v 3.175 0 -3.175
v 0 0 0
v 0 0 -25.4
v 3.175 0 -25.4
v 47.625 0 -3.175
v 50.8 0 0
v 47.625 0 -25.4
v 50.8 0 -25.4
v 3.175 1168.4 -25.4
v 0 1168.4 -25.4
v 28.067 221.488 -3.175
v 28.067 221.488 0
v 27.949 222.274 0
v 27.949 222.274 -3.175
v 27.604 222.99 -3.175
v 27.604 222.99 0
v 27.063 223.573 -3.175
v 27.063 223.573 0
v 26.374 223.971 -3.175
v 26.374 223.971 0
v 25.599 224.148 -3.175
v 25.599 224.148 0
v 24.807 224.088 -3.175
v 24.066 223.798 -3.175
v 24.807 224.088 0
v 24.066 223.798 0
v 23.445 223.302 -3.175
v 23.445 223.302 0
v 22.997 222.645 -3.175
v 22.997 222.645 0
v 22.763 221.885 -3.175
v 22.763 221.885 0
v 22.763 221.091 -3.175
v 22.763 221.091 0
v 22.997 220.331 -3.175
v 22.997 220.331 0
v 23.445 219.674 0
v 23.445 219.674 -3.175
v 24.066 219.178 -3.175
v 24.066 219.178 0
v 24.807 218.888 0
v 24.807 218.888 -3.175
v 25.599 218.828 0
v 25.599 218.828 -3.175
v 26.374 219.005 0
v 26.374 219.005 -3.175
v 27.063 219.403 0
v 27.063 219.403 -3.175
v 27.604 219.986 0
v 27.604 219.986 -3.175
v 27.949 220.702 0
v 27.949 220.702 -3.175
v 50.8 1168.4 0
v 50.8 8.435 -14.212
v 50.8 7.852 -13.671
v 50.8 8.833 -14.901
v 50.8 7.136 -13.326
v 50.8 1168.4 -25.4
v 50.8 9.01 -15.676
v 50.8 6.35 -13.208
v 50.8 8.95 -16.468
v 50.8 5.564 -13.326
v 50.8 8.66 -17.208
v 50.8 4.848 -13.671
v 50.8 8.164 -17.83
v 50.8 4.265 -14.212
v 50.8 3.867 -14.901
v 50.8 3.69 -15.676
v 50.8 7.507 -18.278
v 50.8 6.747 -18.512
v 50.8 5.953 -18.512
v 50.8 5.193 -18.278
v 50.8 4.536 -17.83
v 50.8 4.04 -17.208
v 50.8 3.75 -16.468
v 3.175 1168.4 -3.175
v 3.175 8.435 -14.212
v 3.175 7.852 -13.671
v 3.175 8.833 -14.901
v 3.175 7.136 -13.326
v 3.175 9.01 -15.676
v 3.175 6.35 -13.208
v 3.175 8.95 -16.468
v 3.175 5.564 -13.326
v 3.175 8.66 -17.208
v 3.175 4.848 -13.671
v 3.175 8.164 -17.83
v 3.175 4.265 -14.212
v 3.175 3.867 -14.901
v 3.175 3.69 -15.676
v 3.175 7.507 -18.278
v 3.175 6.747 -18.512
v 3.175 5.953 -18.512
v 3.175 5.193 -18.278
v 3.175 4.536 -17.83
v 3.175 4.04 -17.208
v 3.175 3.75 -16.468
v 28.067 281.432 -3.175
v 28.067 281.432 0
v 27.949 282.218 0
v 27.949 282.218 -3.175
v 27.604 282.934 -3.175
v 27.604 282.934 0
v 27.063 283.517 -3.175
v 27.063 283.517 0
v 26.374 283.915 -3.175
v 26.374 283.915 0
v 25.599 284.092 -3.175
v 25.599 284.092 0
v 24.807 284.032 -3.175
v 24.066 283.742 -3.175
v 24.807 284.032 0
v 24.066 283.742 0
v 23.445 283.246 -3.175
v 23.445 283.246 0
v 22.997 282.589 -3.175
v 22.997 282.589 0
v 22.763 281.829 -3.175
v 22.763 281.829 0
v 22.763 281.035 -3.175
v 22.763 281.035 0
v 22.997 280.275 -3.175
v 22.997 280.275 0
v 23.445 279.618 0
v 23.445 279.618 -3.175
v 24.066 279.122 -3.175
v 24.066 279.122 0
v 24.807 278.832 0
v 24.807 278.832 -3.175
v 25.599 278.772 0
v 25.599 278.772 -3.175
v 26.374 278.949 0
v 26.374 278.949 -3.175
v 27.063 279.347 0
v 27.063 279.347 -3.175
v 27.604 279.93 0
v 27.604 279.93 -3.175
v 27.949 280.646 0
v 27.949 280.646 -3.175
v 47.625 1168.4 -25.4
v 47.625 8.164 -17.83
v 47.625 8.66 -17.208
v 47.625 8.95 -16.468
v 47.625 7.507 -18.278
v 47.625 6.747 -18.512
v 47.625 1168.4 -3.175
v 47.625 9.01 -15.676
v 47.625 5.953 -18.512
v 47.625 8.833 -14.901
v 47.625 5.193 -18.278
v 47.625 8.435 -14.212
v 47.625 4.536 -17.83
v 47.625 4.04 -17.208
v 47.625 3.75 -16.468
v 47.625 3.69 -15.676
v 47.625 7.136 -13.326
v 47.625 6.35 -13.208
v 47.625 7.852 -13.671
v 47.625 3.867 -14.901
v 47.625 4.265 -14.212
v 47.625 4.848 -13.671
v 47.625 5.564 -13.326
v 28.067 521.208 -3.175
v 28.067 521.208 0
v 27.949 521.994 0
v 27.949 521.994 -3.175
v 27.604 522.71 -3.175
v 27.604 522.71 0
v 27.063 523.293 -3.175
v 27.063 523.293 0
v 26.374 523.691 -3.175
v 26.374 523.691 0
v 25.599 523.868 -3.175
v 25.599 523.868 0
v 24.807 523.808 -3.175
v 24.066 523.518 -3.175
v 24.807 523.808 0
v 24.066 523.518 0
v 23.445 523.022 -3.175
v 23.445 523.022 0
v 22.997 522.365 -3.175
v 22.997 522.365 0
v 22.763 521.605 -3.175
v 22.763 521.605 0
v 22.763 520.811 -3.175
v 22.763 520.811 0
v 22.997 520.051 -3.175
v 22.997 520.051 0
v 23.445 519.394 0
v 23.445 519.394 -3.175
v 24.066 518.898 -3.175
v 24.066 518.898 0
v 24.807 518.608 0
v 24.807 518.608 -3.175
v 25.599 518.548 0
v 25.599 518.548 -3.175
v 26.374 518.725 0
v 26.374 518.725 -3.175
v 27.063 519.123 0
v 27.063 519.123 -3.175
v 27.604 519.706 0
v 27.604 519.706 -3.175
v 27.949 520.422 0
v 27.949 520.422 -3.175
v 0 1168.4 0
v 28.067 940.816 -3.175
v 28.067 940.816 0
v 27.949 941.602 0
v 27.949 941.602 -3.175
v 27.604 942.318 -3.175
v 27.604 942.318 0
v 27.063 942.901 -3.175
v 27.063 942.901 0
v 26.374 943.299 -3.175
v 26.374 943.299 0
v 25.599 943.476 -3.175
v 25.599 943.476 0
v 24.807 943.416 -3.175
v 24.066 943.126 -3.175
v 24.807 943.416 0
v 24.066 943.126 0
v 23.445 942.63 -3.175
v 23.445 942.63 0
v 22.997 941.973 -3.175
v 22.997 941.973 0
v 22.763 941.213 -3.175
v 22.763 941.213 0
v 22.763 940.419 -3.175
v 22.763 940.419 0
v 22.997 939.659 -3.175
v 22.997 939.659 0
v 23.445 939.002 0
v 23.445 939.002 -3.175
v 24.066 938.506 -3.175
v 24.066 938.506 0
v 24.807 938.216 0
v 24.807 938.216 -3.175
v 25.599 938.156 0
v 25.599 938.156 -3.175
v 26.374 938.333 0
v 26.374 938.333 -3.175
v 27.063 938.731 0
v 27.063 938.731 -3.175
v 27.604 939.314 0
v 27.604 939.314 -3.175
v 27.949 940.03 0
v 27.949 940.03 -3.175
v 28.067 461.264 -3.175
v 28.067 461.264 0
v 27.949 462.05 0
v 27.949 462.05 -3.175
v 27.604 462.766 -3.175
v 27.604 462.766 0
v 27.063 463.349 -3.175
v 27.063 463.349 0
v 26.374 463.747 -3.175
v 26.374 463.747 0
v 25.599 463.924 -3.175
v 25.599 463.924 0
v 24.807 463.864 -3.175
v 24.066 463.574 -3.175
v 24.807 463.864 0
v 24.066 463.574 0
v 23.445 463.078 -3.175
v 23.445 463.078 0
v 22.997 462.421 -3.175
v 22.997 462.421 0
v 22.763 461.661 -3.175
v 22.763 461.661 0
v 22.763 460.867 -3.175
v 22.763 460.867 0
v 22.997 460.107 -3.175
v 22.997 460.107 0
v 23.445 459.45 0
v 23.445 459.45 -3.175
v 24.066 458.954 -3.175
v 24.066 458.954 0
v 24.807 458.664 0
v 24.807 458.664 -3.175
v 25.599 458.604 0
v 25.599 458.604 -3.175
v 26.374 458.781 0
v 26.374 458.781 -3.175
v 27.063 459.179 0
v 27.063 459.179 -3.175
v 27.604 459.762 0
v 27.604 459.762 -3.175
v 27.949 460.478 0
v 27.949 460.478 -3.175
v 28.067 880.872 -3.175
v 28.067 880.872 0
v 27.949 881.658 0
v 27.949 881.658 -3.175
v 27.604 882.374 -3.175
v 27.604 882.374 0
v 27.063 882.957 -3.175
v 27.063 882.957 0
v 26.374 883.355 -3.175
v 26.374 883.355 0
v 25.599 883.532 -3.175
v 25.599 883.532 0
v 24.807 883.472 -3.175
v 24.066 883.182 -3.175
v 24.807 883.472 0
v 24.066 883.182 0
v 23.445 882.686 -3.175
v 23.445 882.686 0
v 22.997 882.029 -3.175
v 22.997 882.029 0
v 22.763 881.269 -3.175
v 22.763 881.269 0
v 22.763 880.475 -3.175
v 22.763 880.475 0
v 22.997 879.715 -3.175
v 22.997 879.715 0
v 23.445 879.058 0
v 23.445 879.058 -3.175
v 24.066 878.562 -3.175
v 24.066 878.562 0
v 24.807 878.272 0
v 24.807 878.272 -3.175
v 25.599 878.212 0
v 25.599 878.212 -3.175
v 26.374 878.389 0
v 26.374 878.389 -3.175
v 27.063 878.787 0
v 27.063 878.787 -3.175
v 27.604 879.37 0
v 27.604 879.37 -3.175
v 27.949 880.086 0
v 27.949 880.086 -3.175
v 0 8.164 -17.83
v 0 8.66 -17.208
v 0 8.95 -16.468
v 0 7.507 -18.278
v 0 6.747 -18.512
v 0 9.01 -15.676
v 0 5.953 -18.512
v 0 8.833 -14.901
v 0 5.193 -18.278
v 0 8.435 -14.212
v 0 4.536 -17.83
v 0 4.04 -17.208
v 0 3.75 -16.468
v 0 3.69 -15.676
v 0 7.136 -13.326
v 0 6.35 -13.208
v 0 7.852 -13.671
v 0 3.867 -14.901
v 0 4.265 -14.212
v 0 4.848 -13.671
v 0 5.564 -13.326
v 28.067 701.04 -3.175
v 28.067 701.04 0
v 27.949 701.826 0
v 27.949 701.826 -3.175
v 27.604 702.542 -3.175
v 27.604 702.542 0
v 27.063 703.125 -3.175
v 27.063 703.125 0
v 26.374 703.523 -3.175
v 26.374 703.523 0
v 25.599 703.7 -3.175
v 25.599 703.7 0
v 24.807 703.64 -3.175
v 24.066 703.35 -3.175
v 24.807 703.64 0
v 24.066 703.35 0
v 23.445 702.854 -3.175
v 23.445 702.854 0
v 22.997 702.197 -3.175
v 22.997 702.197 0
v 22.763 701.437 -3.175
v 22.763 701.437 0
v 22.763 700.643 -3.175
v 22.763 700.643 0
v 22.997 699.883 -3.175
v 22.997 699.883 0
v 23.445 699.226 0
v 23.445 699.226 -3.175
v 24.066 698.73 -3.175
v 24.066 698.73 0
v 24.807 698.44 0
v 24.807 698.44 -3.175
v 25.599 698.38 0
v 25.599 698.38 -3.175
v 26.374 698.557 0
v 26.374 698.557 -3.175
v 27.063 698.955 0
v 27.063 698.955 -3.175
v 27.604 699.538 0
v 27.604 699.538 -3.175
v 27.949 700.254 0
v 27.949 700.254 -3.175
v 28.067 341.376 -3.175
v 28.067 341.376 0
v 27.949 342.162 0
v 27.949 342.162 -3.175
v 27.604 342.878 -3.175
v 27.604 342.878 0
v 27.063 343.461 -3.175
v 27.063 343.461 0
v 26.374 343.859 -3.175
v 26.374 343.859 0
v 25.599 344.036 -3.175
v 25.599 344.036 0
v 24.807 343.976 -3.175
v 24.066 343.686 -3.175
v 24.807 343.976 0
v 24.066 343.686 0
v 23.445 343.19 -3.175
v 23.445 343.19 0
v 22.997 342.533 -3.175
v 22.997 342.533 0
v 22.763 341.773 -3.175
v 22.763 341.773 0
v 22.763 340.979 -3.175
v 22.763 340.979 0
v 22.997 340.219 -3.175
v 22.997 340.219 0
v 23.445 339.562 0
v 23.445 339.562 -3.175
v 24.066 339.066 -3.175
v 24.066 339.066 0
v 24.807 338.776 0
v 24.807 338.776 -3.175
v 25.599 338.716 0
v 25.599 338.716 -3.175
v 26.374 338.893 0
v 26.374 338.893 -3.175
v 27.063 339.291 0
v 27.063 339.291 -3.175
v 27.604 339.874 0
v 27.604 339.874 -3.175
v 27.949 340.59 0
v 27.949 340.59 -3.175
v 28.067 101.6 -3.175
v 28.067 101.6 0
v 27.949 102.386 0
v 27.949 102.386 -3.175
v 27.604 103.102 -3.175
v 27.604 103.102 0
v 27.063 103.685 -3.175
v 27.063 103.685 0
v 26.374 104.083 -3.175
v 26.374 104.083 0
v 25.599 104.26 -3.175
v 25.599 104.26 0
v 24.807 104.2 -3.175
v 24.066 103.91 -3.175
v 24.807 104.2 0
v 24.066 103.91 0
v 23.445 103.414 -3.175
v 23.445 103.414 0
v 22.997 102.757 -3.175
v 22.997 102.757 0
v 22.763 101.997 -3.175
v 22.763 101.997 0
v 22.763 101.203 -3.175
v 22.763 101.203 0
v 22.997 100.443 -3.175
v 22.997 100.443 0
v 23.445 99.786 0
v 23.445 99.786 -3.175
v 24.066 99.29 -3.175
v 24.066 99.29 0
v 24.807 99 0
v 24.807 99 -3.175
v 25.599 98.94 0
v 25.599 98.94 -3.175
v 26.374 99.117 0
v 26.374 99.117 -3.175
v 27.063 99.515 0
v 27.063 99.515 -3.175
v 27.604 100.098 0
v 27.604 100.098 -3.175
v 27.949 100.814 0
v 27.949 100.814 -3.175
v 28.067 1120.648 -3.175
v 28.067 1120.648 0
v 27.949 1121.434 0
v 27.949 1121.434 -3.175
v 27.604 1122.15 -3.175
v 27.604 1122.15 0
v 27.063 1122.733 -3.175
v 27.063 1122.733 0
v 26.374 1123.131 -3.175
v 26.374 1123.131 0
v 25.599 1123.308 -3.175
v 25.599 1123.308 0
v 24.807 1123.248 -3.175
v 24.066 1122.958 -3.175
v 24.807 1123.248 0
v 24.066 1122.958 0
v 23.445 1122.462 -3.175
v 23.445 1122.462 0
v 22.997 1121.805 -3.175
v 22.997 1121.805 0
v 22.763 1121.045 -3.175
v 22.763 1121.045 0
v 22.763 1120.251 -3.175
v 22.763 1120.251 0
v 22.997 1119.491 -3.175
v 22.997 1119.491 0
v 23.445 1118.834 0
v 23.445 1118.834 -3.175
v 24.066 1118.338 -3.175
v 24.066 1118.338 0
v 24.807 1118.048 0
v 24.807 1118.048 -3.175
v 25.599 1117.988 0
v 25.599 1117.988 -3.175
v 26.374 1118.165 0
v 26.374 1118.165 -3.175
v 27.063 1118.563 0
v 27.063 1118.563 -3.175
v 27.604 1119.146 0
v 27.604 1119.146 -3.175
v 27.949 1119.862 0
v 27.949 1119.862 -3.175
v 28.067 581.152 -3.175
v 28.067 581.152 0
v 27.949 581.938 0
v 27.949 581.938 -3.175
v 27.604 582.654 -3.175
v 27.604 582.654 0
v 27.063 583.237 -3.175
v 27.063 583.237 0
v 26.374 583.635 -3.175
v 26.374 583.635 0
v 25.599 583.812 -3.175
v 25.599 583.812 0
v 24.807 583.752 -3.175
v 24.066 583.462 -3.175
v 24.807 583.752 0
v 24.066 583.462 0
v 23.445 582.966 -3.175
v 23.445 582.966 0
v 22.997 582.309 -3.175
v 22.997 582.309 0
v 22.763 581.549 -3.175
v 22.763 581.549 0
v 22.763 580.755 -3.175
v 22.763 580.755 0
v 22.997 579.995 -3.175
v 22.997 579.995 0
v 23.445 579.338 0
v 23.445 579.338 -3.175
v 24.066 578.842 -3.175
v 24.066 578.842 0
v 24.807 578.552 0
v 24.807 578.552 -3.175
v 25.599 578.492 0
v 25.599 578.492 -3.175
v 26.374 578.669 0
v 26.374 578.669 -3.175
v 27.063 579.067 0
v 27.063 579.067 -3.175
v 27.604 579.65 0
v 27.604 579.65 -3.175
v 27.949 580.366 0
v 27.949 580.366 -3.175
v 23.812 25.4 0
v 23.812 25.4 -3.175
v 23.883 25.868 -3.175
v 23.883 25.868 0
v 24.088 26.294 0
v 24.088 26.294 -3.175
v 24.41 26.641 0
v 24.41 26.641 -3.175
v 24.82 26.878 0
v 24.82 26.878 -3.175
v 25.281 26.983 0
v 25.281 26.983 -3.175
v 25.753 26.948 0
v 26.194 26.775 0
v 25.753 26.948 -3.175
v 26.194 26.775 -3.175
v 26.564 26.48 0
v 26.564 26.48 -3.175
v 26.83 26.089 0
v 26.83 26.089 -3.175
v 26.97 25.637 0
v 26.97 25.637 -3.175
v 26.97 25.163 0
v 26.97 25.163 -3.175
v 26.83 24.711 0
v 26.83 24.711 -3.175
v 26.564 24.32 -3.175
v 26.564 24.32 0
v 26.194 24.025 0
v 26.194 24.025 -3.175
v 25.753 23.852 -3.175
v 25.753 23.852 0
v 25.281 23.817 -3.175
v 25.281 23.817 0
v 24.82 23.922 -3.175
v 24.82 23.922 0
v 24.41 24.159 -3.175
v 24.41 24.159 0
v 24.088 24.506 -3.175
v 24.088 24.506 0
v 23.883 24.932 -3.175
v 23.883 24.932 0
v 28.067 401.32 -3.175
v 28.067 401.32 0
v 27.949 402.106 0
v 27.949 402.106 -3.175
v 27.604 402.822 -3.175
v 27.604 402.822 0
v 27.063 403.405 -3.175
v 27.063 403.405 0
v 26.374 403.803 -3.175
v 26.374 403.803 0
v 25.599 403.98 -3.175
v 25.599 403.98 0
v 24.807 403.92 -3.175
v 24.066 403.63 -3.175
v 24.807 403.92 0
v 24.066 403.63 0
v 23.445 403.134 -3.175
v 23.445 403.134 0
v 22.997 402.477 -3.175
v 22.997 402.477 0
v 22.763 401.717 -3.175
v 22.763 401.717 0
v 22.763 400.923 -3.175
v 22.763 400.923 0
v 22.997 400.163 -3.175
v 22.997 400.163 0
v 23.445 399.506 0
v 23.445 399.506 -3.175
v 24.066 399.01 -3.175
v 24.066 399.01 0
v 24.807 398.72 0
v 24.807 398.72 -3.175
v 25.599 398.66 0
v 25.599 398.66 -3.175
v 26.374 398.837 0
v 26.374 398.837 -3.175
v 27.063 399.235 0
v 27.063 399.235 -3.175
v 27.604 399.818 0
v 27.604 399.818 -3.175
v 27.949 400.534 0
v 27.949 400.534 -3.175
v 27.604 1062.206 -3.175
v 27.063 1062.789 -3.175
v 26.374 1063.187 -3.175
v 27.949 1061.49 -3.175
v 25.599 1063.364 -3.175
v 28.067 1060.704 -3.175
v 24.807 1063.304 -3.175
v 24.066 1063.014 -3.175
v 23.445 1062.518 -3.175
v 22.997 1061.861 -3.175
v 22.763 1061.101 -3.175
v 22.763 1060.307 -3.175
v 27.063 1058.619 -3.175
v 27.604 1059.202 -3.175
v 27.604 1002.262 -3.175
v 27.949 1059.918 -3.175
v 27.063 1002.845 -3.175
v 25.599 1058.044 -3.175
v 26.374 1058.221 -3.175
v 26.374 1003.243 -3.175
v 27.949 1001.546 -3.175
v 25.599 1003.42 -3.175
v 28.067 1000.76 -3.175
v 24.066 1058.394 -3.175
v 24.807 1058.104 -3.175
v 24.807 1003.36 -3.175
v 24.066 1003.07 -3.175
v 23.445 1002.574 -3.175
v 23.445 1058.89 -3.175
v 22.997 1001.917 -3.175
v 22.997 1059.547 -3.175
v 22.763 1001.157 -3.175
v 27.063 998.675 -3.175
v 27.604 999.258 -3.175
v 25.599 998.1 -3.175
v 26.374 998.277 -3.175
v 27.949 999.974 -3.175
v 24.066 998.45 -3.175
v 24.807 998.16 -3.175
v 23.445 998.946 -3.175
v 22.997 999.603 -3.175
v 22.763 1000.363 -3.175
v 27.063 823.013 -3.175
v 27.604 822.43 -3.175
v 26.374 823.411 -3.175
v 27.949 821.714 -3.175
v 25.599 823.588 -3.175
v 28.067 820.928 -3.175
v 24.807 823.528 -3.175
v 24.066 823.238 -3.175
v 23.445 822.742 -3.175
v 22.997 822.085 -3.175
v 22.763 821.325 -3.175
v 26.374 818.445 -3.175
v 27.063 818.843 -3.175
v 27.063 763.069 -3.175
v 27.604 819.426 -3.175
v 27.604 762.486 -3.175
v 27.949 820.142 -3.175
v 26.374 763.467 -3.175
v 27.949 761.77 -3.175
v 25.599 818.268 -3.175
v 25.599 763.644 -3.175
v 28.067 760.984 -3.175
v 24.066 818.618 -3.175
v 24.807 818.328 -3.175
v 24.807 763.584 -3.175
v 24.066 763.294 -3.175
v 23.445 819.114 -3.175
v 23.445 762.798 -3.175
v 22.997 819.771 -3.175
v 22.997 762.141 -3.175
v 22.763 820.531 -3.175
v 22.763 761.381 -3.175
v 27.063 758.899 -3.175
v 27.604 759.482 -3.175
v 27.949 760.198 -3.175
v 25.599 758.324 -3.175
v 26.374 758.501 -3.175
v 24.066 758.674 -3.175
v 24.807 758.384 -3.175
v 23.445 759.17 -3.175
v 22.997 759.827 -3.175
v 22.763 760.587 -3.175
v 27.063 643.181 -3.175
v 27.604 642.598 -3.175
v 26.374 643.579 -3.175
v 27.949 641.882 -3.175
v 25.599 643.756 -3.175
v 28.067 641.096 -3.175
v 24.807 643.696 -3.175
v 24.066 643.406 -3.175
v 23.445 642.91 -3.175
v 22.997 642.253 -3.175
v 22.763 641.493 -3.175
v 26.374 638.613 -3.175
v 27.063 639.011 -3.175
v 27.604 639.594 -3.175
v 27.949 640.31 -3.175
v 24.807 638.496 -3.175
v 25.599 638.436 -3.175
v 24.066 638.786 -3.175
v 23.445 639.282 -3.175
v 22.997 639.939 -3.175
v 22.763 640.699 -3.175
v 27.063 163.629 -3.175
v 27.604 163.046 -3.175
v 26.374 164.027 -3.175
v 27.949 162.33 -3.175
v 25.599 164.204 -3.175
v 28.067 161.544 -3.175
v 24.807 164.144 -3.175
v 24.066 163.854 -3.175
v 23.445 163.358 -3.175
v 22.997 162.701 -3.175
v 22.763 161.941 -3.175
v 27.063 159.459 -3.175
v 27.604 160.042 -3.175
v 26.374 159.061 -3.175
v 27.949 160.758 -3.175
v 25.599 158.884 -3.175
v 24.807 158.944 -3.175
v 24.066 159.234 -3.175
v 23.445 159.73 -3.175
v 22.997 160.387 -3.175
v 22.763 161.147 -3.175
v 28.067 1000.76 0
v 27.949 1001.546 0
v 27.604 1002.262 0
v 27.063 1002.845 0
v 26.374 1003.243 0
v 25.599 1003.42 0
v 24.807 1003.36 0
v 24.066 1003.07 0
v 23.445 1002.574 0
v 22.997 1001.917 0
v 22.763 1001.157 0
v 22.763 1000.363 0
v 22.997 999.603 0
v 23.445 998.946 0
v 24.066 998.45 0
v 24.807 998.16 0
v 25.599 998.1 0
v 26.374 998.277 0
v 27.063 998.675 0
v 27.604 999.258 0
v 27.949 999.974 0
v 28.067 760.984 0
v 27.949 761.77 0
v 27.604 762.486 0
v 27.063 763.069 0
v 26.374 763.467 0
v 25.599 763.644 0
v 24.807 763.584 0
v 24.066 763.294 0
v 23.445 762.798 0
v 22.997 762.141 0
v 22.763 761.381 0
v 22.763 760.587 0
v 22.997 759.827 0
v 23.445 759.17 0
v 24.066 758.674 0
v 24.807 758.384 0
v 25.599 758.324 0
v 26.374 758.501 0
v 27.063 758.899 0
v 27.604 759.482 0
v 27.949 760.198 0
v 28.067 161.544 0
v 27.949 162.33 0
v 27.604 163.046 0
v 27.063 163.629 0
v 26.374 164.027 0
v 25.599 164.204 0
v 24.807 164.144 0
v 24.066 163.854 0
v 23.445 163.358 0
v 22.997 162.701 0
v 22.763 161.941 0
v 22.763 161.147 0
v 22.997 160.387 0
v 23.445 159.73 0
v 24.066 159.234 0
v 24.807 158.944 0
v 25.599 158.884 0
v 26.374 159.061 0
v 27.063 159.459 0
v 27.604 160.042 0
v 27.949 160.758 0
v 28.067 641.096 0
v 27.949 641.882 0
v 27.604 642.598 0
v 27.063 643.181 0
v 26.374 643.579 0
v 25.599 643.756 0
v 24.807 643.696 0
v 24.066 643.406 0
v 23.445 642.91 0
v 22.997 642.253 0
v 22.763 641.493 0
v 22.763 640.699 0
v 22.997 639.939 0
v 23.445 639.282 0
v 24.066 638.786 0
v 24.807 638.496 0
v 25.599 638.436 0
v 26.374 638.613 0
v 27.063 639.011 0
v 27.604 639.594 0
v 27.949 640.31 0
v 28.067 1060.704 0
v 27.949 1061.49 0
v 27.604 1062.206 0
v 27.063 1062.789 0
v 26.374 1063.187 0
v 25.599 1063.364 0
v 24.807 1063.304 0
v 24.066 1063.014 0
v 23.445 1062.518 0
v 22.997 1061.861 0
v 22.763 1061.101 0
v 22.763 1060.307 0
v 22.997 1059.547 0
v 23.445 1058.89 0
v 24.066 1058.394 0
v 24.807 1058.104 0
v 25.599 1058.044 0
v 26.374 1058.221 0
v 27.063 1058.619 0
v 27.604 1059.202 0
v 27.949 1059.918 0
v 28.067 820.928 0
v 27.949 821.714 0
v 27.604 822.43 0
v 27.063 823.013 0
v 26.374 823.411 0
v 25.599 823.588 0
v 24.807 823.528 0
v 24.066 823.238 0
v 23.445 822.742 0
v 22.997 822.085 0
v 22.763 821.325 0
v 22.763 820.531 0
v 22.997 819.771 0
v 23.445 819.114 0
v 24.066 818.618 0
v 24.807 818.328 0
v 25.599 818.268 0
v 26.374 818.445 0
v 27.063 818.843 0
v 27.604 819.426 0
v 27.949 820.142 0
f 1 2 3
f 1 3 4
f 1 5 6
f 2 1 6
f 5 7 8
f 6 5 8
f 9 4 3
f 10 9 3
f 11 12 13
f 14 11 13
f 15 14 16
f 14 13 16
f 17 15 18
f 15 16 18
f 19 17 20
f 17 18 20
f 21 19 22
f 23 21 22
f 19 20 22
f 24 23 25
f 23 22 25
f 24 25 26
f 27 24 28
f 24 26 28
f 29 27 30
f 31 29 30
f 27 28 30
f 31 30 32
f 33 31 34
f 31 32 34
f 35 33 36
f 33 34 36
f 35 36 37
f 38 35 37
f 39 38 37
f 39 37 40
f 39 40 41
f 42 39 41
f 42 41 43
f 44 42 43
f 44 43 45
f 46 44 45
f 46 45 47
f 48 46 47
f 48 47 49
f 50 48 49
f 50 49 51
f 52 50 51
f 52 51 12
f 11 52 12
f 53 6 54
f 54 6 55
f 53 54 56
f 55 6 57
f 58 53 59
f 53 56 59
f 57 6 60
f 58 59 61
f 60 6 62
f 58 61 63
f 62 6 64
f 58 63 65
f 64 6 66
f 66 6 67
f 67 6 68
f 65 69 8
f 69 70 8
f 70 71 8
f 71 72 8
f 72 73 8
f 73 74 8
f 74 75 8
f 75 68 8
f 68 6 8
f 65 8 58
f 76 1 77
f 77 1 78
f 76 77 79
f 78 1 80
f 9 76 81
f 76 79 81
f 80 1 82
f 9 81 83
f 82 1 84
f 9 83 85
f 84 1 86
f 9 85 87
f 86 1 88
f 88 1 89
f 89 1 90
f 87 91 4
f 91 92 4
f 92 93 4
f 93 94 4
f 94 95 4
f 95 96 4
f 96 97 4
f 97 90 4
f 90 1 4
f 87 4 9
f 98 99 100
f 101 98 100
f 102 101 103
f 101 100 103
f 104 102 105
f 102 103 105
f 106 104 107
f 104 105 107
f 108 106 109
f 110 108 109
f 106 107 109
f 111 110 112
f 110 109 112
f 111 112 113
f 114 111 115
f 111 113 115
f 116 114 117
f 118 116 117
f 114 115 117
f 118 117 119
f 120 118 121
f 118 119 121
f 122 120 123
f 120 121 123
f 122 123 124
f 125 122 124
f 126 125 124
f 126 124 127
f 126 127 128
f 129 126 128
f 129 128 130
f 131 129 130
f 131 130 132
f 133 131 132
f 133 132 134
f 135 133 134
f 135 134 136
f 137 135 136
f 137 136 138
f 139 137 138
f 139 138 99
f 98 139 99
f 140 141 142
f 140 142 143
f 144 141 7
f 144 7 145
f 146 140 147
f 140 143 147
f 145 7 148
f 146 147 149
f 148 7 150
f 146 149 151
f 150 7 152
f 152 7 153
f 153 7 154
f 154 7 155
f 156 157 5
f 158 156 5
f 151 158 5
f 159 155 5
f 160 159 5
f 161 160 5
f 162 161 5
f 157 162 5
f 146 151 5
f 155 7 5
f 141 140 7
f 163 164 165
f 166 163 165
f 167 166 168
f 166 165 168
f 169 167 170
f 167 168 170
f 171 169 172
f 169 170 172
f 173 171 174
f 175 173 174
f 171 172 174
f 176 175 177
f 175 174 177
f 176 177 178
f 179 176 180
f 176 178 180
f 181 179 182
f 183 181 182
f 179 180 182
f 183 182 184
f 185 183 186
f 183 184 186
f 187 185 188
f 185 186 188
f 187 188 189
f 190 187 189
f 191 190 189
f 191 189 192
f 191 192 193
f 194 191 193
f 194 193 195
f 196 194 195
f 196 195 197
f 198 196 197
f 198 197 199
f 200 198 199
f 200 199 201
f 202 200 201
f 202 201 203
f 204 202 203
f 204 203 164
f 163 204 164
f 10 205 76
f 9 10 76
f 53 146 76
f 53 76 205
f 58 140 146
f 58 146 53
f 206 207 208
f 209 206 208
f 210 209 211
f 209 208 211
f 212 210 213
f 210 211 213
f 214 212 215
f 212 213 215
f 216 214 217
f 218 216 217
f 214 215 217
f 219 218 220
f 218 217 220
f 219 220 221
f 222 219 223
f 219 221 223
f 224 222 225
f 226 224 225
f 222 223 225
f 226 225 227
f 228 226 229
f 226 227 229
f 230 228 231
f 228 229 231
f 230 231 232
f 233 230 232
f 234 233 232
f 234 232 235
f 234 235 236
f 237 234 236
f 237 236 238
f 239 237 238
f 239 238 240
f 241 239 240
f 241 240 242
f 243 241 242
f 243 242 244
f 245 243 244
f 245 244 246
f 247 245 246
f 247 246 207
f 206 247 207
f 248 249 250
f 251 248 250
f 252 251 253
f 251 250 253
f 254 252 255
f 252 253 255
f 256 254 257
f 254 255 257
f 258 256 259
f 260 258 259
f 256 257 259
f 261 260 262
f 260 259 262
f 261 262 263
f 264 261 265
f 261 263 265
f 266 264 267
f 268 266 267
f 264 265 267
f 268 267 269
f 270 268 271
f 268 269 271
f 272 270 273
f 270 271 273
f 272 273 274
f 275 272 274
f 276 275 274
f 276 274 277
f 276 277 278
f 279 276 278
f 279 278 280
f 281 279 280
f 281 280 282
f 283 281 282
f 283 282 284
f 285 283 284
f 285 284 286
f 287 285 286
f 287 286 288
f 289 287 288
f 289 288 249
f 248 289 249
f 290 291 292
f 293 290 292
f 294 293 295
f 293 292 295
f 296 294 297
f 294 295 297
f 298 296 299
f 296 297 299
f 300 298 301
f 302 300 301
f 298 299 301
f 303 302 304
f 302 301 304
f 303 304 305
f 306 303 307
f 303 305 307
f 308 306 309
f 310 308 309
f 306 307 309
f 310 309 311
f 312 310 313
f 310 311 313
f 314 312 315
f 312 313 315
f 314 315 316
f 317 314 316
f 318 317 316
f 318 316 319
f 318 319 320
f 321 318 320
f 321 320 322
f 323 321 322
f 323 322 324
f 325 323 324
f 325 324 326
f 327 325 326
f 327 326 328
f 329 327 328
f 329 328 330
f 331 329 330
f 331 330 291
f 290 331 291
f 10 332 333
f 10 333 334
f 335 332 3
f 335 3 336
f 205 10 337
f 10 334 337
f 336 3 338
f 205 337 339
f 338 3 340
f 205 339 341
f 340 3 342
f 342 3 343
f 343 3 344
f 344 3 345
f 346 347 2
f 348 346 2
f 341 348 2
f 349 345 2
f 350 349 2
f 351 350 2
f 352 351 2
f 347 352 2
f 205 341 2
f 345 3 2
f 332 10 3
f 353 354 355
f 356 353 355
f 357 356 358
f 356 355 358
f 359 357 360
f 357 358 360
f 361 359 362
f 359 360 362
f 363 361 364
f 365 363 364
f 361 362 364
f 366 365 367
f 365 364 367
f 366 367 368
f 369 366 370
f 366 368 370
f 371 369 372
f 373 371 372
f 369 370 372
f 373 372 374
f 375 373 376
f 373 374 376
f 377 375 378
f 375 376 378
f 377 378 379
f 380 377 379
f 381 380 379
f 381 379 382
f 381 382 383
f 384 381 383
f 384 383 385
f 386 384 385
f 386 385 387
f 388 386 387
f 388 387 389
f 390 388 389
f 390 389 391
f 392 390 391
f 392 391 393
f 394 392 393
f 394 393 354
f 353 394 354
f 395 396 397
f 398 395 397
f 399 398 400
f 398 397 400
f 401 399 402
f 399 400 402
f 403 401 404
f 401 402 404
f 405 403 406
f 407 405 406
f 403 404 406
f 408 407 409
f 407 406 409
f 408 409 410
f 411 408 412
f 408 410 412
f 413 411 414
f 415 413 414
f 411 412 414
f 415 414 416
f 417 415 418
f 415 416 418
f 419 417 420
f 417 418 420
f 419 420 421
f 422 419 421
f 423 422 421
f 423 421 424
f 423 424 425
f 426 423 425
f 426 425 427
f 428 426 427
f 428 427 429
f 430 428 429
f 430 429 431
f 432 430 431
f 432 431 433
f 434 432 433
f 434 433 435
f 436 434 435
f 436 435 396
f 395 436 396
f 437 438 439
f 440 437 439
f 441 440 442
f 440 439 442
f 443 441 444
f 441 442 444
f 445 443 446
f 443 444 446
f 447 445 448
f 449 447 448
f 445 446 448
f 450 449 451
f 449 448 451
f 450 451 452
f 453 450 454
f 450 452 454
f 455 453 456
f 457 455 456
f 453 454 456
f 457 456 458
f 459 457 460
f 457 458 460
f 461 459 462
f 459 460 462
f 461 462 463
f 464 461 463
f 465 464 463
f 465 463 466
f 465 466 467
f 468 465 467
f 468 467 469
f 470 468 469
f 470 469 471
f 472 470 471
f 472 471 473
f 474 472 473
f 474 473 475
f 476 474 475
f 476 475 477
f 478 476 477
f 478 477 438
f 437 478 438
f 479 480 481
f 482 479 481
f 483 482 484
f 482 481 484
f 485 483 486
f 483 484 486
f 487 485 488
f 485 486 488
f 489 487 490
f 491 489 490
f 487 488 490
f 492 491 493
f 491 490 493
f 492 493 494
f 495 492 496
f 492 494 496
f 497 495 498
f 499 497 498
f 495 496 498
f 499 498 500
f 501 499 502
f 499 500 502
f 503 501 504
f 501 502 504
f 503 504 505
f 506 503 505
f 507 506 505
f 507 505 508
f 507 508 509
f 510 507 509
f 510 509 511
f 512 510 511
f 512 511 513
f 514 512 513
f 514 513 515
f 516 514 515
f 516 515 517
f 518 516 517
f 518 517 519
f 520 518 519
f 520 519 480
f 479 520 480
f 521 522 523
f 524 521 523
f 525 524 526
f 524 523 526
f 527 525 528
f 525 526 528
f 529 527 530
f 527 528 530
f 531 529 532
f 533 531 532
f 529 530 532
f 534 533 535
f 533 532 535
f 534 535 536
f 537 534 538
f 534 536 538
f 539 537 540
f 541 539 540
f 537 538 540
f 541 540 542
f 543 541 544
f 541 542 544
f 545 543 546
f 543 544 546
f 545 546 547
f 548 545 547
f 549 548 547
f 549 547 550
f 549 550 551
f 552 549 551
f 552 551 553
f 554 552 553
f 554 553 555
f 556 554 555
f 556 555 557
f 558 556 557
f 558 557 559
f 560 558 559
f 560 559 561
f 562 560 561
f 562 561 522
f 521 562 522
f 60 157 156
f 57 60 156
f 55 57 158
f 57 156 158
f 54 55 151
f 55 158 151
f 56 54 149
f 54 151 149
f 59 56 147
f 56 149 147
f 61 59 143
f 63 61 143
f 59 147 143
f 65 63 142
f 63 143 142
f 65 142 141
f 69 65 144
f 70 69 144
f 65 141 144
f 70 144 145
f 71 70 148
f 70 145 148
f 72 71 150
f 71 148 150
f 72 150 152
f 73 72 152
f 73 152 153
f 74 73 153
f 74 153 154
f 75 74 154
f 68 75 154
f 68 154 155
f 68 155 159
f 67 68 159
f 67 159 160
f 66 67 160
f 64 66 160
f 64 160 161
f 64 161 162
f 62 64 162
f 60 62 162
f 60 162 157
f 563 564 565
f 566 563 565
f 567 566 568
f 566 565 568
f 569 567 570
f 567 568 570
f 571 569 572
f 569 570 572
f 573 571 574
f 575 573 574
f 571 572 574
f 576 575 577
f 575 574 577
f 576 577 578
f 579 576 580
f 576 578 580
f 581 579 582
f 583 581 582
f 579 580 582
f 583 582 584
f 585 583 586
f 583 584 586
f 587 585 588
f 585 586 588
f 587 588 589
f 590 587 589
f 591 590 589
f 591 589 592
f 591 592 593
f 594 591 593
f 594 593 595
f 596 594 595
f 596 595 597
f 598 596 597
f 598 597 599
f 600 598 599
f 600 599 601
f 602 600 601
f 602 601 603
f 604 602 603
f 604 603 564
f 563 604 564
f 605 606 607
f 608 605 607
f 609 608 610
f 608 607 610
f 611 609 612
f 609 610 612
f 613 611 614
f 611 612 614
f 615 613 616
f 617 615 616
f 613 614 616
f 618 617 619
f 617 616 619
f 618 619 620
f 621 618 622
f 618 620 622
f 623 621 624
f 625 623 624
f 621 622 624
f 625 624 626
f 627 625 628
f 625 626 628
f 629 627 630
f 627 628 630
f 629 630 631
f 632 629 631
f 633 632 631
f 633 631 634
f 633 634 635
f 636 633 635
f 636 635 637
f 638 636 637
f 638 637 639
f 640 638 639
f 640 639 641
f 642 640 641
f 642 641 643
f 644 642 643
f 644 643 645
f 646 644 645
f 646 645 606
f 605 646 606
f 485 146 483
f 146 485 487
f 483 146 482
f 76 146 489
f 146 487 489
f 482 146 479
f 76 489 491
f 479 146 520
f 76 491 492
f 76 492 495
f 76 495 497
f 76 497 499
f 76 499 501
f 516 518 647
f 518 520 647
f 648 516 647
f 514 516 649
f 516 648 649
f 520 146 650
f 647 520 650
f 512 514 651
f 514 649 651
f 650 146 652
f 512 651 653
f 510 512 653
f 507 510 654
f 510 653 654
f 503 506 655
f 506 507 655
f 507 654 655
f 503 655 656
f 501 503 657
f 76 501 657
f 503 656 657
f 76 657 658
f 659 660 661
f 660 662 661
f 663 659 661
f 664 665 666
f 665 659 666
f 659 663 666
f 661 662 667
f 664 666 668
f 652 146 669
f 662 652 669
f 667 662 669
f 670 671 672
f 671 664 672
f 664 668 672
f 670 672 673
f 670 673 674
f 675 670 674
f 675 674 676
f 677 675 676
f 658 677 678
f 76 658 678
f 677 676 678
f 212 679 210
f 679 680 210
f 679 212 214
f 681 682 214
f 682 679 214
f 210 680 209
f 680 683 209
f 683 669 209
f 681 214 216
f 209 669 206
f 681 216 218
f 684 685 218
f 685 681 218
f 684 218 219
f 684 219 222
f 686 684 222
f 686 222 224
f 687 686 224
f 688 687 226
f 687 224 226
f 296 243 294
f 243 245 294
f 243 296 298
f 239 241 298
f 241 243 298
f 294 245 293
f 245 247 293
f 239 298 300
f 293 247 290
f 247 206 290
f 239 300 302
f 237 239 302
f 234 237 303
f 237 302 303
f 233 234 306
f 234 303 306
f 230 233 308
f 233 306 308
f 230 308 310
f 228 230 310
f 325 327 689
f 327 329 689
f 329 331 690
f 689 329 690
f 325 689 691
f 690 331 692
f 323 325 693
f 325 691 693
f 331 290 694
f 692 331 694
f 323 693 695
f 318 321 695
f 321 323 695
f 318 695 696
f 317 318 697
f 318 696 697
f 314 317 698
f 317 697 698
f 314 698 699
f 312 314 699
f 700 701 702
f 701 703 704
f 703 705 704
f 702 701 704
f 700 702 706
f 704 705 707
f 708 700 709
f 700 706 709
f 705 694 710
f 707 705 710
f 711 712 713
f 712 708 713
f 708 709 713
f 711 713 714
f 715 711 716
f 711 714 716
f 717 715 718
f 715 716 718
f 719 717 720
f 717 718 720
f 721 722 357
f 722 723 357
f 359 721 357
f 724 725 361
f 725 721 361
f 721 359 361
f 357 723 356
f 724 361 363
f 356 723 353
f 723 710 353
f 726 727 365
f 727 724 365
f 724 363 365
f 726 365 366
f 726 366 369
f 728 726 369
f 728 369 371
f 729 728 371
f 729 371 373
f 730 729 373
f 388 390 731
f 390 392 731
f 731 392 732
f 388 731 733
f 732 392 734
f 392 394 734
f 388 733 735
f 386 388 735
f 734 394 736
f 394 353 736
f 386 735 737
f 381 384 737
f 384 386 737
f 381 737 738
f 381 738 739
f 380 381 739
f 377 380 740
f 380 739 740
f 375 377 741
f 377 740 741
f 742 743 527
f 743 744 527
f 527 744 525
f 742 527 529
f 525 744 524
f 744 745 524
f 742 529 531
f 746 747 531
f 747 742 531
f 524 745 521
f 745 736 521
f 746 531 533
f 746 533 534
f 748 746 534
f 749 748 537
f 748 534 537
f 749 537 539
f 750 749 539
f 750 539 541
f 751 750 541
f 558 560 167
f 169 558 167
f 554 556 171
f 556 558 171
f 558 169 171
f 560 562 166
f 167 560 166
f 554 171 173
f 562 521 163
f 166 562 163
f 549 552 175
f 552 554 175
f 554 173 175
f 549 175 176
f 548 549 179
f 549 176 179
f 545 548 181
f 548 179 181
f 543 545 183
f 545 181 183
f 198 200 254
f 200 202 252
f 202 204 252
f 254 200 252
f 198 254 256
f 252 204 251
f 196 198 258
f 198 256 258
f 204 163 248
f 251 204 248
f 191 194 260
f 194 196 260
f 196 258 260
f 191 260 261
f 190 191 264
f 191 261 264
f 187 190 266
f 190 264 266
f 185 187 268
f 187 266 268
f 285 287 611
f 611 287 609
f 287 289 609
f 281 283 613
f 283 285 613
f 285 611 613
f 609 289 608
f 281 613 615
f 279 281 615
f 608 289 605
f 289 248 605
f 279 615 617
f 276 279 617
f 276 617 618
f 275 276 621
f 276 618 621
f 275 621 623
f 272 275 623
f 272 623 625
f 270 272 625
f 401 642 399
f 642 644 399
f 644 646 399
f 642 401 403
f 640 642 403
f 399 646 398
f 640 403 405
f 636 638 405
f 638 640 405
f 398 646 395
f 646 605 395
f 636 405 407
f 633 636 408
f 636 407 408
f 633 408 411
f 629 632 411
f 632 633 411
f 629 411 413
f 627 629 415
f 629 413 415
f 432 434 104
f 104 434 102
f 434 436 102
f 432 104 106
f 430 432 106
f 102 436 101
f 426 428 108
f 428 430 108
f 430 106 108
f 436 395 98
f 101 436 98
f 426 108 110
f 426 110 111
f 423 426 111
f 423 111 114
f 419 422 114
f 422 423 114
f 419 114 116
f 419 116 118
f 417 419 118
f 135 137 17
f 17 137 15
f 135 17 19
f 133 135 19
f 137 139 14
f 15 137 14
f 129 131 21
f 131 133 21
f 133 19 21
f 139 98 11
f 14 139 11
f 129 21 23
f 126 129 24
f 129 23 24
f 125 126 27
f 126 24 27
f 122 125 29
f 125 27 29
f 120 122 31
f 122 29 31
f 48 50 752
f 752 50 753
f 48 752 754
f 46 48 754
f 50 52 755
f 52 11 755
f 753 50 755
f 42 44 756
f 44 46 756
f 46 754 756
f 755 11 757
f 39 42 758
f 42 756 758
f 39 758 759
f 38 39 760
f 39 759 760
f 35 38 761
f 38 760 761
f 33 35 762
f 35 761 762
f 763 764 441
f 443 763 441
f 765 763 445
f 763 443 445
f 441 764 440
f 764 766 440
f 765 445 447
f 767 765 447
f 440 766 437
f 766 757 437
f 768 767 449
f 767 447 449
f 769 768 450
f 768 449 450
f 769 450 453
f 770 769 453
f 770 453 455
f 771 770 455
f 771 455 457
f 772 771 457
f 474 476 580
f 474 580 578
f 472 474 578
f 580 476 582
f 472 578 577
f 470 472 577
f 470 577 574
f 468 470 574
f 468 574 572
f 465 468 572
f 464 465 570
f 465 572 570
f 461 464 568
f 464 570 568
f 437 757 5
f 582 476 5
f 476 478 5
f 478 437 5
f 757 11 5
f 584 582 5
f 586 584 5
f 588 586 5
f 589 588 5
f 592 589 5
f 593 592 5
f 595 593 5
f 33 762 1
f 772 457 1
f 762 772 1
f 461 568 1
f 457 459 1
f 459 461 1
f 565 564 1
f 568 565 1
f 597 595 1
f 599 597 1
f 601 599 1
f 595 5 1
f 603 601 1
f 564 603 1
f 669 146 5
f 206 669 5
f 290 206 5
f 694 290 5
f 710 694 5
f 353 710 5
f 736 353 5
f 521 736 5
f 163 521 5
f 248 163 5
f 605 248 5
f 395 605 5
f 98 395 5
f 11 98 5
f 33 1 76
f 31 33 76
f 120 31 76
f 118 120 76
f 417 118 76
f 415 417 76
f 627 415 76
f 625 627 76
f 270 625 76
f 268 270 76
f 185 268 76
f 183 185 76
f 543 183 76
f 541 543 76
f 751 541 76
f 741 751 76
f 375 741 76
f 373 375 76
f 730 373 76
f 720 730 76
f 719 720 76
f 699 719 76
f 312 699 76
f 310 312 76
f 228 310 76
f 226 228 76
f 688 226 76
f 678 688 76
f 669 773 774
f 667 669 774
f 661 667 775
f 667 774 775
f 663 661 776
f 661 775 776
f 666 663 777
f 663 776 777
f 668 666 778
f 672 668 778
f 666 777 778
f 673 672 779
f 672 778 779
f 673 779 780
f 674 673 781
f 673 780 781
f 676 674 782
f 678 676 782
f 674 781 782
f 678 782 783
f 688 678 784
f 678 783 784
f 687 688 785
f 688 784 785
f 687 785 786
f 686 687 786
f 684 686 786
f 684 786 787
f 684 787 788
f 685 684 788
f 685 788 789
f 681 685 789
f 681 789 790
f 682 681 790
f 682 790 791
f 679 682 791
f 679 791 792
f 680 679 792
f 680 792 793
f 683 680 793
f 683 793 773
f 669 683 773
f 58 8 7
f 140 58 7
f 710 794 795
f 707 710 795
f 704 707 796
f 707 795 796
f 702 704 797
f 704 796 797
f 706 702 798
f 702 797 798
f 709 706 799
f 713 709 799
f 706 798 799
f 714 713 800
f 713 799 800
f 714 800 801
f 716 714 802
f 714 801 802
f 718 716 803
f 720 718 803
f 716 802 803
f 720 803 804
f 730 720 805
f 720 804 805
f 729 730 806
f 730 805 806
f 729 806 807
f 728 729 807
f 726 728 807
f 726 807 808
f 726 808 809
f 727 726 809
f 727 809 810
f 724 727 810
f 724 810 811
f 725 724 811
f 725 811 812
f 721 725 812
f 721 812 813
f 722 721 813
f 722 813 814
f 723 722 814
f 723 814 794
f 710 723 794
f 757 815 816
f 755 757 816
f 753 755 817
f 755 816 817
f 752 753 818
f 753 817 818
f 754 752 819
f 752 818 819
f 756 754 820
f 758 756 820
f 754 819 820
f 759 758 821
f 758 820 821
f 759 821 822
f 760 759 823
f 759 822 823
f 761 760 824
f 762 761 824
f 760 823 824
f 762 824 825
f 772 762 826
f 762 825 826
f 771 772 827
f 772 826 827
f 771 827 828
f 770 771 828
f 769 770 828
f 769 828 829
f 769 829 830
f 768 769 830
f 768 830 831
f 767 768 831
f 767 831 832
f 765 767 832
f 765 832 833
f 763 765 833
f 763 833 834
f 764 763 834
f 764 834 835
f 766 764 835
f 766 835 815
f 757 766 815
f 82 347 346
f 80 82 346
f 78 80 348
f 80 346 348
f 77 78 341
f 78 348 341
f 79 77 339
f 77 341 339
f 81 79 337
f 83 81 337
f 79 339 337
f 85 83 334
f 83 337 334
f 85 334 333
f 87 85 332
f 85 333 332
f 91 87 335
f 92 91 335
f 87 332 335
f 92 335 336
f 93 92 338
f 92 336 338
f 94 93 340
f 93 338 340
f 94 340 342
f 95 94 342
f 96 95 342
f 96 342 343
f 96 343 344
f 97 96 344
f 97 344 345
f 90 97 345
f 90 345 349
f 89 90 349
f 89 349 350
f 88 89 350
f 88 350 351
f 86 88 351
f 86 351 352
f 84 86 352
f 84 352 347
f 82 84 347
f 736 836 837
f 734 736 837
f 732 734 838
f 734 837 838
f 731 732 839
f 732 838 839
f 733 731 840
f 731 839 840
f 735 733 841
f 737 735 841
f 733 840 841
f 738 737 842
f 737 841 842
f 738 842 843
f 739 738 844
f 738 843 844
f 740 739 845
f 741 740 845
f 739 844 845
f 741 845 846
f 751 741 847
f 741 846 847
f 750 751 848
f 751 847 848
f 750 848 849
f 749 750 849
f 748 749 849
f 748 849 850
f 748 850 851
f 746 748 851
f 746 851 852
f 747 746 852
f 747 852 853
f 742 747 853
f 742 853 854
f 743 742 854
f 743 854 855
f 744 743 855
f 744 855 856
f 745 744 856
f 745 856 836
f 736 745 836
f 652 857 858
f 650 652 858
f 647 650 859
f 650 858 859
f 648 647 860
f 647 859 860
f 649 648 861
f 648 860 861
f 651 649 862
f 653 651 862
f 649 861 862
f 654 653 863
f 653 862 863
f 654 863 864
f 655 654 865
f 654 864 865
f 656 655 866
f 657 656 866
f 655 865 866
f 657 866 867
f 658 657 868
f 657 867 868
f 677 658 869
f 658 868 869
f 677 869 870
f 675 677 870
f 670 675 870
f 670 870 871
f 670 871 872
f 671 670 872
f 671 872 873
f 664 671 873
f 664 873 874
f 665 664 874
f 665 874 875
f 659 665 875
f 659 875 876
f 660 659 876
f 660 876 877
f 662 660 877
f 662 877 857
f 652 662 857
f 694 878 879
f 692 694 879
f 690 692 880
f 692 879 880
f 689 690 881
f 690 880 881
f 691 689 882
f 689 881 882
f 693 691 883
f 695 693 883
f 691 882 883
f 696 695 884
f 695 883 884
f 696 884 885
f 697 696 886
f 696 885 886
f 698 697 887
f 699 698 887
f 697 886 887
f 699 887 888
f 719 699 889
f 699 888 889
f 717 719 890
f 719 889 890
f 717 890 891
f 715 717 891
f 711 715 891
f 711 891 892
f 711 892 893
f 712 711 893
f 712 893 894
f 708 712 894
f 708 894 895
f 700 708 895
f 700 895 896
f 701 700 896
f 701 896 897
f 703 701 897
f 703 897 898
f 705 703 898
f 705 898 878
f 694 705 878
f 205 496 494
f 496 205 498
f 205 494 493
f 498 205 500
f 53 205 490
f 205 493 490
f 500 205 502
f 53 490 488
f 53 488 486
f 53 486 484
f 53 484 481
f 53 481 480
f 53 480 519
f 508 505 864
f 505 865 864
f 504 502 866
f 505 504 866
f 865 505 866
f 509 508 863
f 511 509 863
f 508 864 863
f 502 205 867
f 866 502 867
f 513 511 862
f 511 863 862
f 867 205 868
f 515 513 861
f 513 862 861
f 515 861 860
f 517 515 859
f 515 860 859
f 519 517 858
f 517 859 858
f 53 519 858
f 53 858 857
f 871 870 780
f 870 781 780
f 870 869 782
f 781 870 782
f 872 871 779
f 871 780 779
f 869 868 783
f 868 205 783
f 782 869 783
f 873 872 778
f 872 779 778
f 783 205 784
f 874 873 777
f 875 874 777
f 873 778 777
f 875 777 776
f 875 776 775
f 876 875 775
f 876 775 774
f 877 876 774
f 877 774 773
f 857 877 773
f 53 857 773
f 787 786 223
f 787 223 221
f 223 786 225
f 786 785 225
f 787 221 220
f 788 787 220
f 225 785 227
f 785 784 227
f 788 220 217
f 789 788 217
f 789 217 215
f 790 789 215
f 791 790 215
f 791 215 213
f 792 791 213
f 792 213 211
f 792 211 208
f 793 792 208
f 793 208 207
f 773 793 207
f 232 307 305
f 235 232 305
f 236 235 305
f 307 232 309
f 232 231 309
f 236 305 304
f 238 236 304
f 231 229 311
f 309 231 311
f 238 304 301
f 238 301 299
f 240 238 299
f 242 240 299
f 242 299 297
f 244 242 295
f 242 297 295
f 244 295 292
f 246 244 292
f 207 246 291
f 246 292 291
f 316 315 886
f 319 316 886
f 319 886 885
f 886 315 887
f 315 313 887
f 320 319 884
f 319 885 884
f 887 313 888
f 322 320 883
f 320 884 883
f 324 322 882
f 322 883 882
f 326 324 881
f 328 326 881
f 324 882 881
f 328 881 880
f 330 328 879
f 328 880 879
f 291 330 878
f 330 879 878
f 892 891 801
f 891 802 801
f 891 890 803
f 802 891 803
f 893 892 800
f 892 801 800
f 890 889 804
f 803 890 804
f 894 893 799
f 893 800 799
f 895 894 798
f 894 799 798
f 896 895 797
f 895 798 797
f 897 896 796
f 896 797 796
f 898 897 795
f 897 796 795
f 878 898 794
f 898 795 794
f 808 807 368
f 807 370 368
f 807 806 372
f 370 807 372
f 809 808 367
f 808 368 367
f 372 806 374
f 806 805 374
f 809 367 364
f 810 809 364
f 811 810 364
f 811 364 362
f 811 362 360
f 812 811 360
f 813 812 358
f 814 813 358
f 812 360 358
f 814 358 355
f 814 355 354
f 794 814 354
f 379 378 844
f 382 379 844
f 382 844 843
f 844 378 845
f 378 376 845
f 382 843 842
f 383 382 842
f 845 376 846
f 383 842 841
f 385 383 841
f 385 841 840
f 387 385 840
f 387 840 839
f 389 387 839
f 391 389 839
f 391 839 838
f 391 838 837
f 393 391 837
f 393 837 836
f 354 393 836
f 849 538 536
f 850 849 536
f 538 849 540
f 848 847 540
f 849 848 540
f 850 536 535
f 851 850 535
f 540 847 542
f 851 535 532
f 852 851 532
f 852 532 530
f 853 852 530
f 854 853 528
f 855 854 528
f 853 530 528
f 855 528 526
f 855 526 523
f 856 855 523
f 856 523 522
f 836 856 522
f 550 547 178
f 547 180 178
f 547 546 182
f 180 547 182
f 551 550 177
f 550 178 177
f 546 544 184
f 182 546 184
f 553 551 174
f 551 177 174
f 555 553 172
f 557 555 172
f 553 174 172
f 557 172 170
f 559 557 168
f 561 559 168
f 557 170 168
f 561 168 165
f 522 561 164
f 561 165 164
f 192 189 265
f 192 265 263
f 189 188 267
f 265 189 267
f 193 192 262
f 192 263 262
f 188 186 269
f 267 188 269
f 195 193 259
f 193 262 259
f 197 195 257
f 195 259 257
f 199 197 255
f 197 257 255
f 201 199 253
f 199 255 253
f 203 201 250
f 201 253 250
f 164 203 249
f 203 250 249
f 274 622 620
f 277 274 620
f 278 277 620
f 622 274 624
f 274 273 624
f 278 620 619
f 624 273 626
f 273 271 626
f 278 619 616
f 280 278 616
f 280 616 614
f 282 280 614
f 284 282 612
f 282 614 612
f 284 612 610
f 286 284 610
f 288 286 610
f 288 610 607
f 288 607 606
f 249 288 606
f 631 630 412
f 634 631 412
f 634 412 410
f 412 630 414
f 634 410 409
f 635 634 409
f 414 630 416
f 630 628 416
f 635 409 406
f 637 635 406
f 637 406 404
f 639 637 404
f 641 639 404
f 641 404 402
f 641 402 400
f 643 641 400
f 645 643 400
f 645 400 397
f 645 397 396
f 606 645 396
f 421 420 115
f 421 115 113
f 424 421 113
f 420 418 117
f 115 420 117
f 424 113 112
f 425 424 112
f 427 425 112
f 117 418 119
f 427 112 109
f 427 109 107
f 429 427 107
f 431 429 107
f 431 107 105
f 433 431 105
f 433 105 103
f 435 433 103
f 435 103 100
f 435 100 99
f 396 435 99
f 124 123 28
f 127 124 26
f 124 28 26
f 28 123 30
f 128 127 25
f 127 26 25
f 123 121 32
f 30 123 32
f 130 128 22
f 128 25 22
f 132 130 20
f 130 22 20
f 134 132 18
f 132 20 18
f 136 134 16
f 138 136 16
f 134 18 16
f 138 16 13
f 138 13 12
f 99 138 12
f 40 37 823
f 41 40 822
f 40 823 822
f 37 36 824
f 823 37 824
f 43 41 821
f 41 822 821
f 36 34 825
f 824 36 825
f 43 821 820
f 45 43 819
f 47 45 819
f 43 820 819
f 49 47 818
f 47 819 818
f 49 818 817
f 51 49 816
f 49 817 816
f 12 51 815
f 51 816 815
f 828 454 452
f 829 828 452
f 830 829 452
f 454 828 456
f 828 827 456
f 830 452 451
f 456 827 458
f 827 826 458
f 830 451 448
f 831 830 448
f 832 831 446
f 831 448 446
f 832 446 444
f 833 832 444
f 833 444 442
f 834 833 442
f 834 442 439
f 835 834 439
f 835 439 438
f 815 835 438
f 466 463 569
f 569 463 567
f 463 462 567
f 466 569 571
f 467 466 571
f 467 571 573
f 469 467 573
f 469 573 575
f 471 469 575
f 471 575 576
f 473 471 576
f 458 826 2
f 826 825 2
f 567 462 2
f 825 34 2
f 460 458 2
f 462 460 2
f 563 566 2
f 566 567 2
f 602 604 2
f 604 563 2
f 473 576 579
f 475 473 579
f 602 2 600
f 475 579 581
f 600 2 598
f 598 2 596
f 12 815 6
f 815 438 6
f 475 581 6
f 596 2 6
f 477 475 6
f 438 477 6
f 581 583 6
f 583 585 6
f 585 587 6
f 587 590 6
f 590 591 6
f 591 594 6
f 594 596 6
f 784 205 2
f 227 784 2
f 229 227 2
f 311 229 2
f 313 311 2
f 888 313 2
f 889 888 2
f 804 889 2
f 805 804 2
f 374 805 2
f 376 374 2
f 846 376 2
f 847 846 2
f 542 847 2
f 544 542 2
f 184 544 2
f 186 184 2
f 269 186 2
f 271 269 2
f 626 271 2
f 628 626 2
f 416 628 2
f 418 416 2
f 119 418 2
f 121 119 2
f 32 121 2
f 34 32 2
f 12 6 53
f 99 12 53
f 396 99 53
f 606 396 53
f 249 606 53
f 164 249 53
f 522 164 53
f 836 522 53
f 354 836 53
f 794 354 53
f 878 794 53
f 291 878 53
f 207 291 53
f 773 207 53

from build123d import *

# Parameters (mm, degrees)
BOSS_EXTRUDE1_DEPTH = 1168.4
IGUS_HOLES_REACH    = 27.4
SKETCH2_R           = 2.667
CUT_EXTRUDE2_REACH  = 5.175
SKETCH3_R           = 1.5875
SKETCH4_R           = 2.667
CUT_EXTRUDE3_DEPTH  = 51.8


with BuildPart() as part:
    # Sketch1 → Boss-Extrude1 (new body)
    with BuildSketch(Plane(origin=(0, 0, 0), x_dir=(1, 0, 0), z_dir=(0, 1, 0))):
        Polygon((3.175, 3.175), (3.175, 25.4), (0, 25.4), (0, 0), (50.8, 0), (50.8, 25.4), (47.625, 25.4), (47.625, 3.175), align=None)
    extrude(amount=BOSS_EXTRUDE1_DEPTH)

    # Sketch2 → Igus_Holes (cut, up to next)
    with BuildSketch(Plane.XY, mode=Mode.PRIVATE) as igus_holes_sk1:
        with Locations((25.4, 101.6)):
            Circle(SKETCH2_R)
    igus_holes_tool1 = extrude(igus_holes_sk1.sketch, amount=-IGUS_HOLES_REACH, mode=Mode.PRIVATE) & part.part
    add(igus_holes_tool1.solids().sort_by_distance((25.4, 101.6, 0))[0], mode=Mode.SUBTRACT)
    # Sketch2 → Igus_Holes (cut, up to next)
    with BuildSketch(Plane.XY, mode=Mode.PRIVATE) as igus_holes_sk2:
        with Locations((25.4, 161.544)):
            Circle(SKETCH2_R)
    igus_holes_tool2 = extrude(igus_holes_sk2.sketch, amount=-IGUS_HOLES_REACH, mode=Mode.PRIVATE) & part.part
    add(igus_holes_tool2.solids().sort_by_distance((25.4, 161.544, 0))[0], mode=Mode.SUBTRACT)
    # Sketch2 → Igus_Holes (cut, up to next)
    with BuildSketch(Plane.XY, mode=Mode.PRIVATE) as igus_holes_sk3:
        with Locations((25.4, 221.488)):
            Circle(SKETCH2_R)
    igus_holes_tool3 = extrude(igus_holes_sk3.sketch, amount=-IGUS_HOLES_REACH, mode=Mode.PRIVATE) & part.part
    add(igus_holes_tool3.solids().sort_by_distance((25.4, 221.488, 0))[0], mode=Mode.SUBTRACT)
    # Sketch2 → Igus_Holes (cut, up to next)
    with BuildSketch(Plane.XY, mode=Mode.PRIVATE) as igus_holes_sk4:
        with Locations((25.4, 281.432)):
            Circle(SKETCH2_R)
    igus_holes_tool4 = extrude(igus_holes_sk4.sketch, amount=-IGUS_HOLES_REACH, mode=Mode.PRIVATE) & part.part
    add(igus_holes_tool4.solids().sort_by_distance((25.4, 281.432, 0))[0], mode=Mode.SUBTRACT)
    # Sketch2 → Igus_Holes (cut, up to next)
    with BuildSketch(Plane.XY, mode=Mode.PRIVATE) as igus_holes_sk5:
        with Locations((25.4, 341.376)):
            Circle(SKETCH2_R)
    igus_holes_tool5 = extrude(igus_holes_sk5.sketch, amount=-IGUS_HOLES_REACH, mode=Mode.PRIVATE) & part.part
    add(igus_holes_tool5.solids().sort_by_distance((25.4, 341.376, 0))[0], mode=Mode.SUBTRACT)
    # Sketch2 → Igus_Holes (cut, up to next)
    with BuildSketch(Plane.XY, mode=Mode.PRIVATE) as igus_holes_sk6:
        with Locations((25.4, 401.32)):
            Circle(SKETCH2_R)
    igus_holes_tool6 = extrude(igus_holes_sk6.sketch, amount=-IGUS_HOLES_REACH, mode=Mode.PRIVATE) & part.part
    add(igus_holes_tool6.solids().sort_by_distance((25.4, 401.32, 0))[0], mode=Mode.SUBTRACT)
    # Sketch2 → Igus_Holes (cut, up to next)
    with BuildSketch(Plane.XY, mode=Mode.PRIVATE) as igus_holes_sk7:
        with Locations((25.4, 461.264)):
            Circle(SKETCH2_R)
    igus_holes_tool7 = extrude(igus_holes_sk7.sketch, amount=-IGUS_HOLES_REACH, mode=Mode.PRIVATE) & part.part
    add(igus_holes_tool7.solids().sort_by_distance((25.4, 461.264, 0))[0], mode=Mode.SUBTRACT)
    # Sketch2 → Igus_Holes (cut, up to next)
    with BuildSketch(Plane.XY, mode=Mode.PRIVATE) as igus_holes_sk8:
        with Locations((25.4, 521.208)):
            Circle(SKETCH2_R)
    igus_holes_tool8 = extrude(igus_holes_sk8.sketch, amount=-IGUS_HOLES_REACH, mode=Mode.PRIVATE) & part.part
    add(igus_holes_tool8.solids().sort_by_distance((25.4, 521.208, 0))[0], mode=Mode.SUBTRACT)
    # Sketch2 → Igus_Holes (cut, up to next)
    with BuildSketch(Plane.XY, mode=Mode.PRIVATE) as igus_holes_sk9:
        with Locations((25.4, 581.152)):
            Circle(SKETCH2_R)
    igus_holes_tool9 = extrude(igus_holes_sk9.sketch, amount=-IGUS_HOLES_REACH, mode=Mode.PRIVATE) & part.part
    add(igus_holes_tool9.solids().sort_by_distance((25.4, 581.152, 0))[0], mode=Mode.SUBTRACT)
    # Sketch2 → Igus_Holes (cut, up to next)
    with BuildSketch(Plane.XY, mode=Mode.PRIVATE) as igus_holes_sk10:
        with Locations((25.4, 641.096)):
            Circle(SKETCH2_R)
    igus_holes_tool10 = extrude(igus_holes_sk10.sketch, amount=-IGUS_HOLES_REACH, mode=Mode.PRIVATE) & part.part
    add(igus_holes_tool10.solids().sort_by_distance((25.4, 641.096, 0))[0], mode=Mode.SUBTRACT)
    # Sketch2 → Igus_Holes (cut, up to next)
    with BuildSketch(Plane.XY, mode=Mode.PRIVATE) as igus_holes_sk11:
        with Locations((25.4, 701.04)):
            Circle(SKETCH2_R)
    igus_holes_tool11 = extrude(igus_holes_sk11.sketch, amount=-IGUS_HOLES_REACH, mode=Mode.PRIVATE) & part.part
    add(igus_holes_tool11.solids().sort_by_distance((25.4, 701.04, 0))[0], mode=Mode.SUBTRACT)
    # Sketch2 → Igus_Holes (cut, up to next)
    with BuildSketch(Plane.XY, mode=Mode.PRIVATE) as igus_holes_sk12:
        with Locations((25.4, 760.984)):
            Circle(SKETCH2_R)
    igus_holes_tool12 = extrude(igus_holes_sk12.sketch, amount=-IGUS_HOLES_REACH, mode=Mode.PRIVATE) & part.part
    add(igus_holes_tool12.solids().sort_by_distance((25.4, 760.984, 0))[0], mode=Mode.SUBTRACT)
    # Sketch2 → Igus_Holes (cut, up to next)
    with BuildSketch(Plane.XY, mode=Mode.PRIVATE) as igus_holes_sk13:
        with Locations((25.4, 820.928)):
            Circle(SKETCH2_R)
    igus_holes_tool13 = extrude(igus_holes_sk13.sketch, amount=-IGUS_HOLES_REACH, mode=Mode.PRIVATE) & part.part
    add(igus_holes_tool13.solids().sort_by_distance((25.4, 820.928, 0))[0], mode=Mode.SUBTRACT)
    # Sketch2 → Igus_Holes (cut, up to next)
    with BuildSketch(Plane.XY, mode=Mode.PRIVATE) as igus_holes_sk14:
        with Locations((25.4, 880.872)):
            Circle(SKETCH2_R)
    igus_holes_tool14 = extrude(igus_holes_sk14.sketch, amount=-IGUS_HOLES_REACH, mode=Mode.PRIVATE) & part.part
    add(igus_holes_tool14.solids().sort_by_distance((25.4, 880.872, 0))[0], mode=Mode.SUBTRACT)
    # Sketch2 → Igus_Holes (cut, up to next)
    with BuildSketch(Plane.XY, mode=Mode.PRIVATE) as igus_holes_sk15:
        with Locations((25.4, 940.816)):
            Circle(SKETCH2_R)
    igus_holes_tool15 = extrude(igus_holes_sk15.sketch, amount=-IGUS_HOLES_REACH, mode=Mode.PRIVATE) & part.part
    add(igus_holes_tool15.solids().sort_by_distance((25.4, 940.816, 0))[0], mode=Mode.SUBTRACT)
    # Sketch2 → Igus_Holes (cut, up to next)
    with BuildSketch(Plane.XY, mode=Mode.PRIVATE) as igus_holes_sk16:
        with Locations((25.4, 1000.76)):
            Circle(SKETCH2_R)
    igus_holes_tool16 = extrude(igus_holes_sk16.sketch, amount=-IGUS_HOLES_REACH, mode=Mode.PRIVATE) & part.part
    add(igus_holes_tool16.solids().sort_by_distance((25.4, 1000.76, 0))[0], mode=Mode.SUBTRACT)
    # Sketch2 → Igus_Holes (cut, up to next)
    with BuildSketch(Plane.XY, mode=Mode.PRIVATE) as igus_holes_sk17:
        with Locations((25.4, 1060.704)):
            Circle(SKETCH2_R)
    igus_holes_tool17 = extrude(igus_holes_sk17.sketch, amount=-IGUS_HOLES_REACH, mode=Mode.PRIVATE) & part.part
    add(igus_holes_tool17.solids().sort_by_distance((25.4, 1060.704, 0))[0], mode=Mode.SUBTRACT)
    # Sketch2 → Igus_Holes (cut, up to next)
    with BuildSketch(Plane.XY, mode=Mode.PRIVATE) as igus_holes_sk18:
        with Locations((25.4, 1120.648)):
            Circle(SKETCH2_R)
    igus_holes_tool18 = extrude(igus_holes_sk18.sketch, amount=-IGUS_HOLES_REACH, mode=Mode.PRIVATE) & part.part
    add(igus_holes_tool18.solids().sort_by_distance((25.4, 1120.648, 0))[0], mode=Mode.SUBTRACT)

    # Sketch3 → Cut-Extrude2 (cut, up to next)
    with BuildSketch(Plane(origin=(0, 0, -3.175), x_dir=(-1, 0, 0), z_dir=(0, 0, -1)), mode=Mode.PRIVATE) as cut_extrude2_sk1:
        with Locations((-25.4, 25.4)):
            Circle(SKETCH3_R)
    cut_extrude2_tool1 = extrude(cut_extrude2_sk1.sketch, amount=-CUT_EXTRUDE2_REACH, mode=Mode.PRIVATE) & part.part
    add(cut_extrude2_tool1.solids().sort_by_distance((25.4, 25.4, -3.175))[0], mode=Mode.SUBTRACT)

    # Sketch4 → Cut-Extrude3 (cut, through all)
    with BuildSketch(Plane.ZY):
        with Locations((-15.875, 6.35)):
            Circle(SKETCH4_R)
    extrude(amount=-CUT_EXTRUDE3_DEPTH, mode=Mode.SUBTRACT)


solid = part.part
